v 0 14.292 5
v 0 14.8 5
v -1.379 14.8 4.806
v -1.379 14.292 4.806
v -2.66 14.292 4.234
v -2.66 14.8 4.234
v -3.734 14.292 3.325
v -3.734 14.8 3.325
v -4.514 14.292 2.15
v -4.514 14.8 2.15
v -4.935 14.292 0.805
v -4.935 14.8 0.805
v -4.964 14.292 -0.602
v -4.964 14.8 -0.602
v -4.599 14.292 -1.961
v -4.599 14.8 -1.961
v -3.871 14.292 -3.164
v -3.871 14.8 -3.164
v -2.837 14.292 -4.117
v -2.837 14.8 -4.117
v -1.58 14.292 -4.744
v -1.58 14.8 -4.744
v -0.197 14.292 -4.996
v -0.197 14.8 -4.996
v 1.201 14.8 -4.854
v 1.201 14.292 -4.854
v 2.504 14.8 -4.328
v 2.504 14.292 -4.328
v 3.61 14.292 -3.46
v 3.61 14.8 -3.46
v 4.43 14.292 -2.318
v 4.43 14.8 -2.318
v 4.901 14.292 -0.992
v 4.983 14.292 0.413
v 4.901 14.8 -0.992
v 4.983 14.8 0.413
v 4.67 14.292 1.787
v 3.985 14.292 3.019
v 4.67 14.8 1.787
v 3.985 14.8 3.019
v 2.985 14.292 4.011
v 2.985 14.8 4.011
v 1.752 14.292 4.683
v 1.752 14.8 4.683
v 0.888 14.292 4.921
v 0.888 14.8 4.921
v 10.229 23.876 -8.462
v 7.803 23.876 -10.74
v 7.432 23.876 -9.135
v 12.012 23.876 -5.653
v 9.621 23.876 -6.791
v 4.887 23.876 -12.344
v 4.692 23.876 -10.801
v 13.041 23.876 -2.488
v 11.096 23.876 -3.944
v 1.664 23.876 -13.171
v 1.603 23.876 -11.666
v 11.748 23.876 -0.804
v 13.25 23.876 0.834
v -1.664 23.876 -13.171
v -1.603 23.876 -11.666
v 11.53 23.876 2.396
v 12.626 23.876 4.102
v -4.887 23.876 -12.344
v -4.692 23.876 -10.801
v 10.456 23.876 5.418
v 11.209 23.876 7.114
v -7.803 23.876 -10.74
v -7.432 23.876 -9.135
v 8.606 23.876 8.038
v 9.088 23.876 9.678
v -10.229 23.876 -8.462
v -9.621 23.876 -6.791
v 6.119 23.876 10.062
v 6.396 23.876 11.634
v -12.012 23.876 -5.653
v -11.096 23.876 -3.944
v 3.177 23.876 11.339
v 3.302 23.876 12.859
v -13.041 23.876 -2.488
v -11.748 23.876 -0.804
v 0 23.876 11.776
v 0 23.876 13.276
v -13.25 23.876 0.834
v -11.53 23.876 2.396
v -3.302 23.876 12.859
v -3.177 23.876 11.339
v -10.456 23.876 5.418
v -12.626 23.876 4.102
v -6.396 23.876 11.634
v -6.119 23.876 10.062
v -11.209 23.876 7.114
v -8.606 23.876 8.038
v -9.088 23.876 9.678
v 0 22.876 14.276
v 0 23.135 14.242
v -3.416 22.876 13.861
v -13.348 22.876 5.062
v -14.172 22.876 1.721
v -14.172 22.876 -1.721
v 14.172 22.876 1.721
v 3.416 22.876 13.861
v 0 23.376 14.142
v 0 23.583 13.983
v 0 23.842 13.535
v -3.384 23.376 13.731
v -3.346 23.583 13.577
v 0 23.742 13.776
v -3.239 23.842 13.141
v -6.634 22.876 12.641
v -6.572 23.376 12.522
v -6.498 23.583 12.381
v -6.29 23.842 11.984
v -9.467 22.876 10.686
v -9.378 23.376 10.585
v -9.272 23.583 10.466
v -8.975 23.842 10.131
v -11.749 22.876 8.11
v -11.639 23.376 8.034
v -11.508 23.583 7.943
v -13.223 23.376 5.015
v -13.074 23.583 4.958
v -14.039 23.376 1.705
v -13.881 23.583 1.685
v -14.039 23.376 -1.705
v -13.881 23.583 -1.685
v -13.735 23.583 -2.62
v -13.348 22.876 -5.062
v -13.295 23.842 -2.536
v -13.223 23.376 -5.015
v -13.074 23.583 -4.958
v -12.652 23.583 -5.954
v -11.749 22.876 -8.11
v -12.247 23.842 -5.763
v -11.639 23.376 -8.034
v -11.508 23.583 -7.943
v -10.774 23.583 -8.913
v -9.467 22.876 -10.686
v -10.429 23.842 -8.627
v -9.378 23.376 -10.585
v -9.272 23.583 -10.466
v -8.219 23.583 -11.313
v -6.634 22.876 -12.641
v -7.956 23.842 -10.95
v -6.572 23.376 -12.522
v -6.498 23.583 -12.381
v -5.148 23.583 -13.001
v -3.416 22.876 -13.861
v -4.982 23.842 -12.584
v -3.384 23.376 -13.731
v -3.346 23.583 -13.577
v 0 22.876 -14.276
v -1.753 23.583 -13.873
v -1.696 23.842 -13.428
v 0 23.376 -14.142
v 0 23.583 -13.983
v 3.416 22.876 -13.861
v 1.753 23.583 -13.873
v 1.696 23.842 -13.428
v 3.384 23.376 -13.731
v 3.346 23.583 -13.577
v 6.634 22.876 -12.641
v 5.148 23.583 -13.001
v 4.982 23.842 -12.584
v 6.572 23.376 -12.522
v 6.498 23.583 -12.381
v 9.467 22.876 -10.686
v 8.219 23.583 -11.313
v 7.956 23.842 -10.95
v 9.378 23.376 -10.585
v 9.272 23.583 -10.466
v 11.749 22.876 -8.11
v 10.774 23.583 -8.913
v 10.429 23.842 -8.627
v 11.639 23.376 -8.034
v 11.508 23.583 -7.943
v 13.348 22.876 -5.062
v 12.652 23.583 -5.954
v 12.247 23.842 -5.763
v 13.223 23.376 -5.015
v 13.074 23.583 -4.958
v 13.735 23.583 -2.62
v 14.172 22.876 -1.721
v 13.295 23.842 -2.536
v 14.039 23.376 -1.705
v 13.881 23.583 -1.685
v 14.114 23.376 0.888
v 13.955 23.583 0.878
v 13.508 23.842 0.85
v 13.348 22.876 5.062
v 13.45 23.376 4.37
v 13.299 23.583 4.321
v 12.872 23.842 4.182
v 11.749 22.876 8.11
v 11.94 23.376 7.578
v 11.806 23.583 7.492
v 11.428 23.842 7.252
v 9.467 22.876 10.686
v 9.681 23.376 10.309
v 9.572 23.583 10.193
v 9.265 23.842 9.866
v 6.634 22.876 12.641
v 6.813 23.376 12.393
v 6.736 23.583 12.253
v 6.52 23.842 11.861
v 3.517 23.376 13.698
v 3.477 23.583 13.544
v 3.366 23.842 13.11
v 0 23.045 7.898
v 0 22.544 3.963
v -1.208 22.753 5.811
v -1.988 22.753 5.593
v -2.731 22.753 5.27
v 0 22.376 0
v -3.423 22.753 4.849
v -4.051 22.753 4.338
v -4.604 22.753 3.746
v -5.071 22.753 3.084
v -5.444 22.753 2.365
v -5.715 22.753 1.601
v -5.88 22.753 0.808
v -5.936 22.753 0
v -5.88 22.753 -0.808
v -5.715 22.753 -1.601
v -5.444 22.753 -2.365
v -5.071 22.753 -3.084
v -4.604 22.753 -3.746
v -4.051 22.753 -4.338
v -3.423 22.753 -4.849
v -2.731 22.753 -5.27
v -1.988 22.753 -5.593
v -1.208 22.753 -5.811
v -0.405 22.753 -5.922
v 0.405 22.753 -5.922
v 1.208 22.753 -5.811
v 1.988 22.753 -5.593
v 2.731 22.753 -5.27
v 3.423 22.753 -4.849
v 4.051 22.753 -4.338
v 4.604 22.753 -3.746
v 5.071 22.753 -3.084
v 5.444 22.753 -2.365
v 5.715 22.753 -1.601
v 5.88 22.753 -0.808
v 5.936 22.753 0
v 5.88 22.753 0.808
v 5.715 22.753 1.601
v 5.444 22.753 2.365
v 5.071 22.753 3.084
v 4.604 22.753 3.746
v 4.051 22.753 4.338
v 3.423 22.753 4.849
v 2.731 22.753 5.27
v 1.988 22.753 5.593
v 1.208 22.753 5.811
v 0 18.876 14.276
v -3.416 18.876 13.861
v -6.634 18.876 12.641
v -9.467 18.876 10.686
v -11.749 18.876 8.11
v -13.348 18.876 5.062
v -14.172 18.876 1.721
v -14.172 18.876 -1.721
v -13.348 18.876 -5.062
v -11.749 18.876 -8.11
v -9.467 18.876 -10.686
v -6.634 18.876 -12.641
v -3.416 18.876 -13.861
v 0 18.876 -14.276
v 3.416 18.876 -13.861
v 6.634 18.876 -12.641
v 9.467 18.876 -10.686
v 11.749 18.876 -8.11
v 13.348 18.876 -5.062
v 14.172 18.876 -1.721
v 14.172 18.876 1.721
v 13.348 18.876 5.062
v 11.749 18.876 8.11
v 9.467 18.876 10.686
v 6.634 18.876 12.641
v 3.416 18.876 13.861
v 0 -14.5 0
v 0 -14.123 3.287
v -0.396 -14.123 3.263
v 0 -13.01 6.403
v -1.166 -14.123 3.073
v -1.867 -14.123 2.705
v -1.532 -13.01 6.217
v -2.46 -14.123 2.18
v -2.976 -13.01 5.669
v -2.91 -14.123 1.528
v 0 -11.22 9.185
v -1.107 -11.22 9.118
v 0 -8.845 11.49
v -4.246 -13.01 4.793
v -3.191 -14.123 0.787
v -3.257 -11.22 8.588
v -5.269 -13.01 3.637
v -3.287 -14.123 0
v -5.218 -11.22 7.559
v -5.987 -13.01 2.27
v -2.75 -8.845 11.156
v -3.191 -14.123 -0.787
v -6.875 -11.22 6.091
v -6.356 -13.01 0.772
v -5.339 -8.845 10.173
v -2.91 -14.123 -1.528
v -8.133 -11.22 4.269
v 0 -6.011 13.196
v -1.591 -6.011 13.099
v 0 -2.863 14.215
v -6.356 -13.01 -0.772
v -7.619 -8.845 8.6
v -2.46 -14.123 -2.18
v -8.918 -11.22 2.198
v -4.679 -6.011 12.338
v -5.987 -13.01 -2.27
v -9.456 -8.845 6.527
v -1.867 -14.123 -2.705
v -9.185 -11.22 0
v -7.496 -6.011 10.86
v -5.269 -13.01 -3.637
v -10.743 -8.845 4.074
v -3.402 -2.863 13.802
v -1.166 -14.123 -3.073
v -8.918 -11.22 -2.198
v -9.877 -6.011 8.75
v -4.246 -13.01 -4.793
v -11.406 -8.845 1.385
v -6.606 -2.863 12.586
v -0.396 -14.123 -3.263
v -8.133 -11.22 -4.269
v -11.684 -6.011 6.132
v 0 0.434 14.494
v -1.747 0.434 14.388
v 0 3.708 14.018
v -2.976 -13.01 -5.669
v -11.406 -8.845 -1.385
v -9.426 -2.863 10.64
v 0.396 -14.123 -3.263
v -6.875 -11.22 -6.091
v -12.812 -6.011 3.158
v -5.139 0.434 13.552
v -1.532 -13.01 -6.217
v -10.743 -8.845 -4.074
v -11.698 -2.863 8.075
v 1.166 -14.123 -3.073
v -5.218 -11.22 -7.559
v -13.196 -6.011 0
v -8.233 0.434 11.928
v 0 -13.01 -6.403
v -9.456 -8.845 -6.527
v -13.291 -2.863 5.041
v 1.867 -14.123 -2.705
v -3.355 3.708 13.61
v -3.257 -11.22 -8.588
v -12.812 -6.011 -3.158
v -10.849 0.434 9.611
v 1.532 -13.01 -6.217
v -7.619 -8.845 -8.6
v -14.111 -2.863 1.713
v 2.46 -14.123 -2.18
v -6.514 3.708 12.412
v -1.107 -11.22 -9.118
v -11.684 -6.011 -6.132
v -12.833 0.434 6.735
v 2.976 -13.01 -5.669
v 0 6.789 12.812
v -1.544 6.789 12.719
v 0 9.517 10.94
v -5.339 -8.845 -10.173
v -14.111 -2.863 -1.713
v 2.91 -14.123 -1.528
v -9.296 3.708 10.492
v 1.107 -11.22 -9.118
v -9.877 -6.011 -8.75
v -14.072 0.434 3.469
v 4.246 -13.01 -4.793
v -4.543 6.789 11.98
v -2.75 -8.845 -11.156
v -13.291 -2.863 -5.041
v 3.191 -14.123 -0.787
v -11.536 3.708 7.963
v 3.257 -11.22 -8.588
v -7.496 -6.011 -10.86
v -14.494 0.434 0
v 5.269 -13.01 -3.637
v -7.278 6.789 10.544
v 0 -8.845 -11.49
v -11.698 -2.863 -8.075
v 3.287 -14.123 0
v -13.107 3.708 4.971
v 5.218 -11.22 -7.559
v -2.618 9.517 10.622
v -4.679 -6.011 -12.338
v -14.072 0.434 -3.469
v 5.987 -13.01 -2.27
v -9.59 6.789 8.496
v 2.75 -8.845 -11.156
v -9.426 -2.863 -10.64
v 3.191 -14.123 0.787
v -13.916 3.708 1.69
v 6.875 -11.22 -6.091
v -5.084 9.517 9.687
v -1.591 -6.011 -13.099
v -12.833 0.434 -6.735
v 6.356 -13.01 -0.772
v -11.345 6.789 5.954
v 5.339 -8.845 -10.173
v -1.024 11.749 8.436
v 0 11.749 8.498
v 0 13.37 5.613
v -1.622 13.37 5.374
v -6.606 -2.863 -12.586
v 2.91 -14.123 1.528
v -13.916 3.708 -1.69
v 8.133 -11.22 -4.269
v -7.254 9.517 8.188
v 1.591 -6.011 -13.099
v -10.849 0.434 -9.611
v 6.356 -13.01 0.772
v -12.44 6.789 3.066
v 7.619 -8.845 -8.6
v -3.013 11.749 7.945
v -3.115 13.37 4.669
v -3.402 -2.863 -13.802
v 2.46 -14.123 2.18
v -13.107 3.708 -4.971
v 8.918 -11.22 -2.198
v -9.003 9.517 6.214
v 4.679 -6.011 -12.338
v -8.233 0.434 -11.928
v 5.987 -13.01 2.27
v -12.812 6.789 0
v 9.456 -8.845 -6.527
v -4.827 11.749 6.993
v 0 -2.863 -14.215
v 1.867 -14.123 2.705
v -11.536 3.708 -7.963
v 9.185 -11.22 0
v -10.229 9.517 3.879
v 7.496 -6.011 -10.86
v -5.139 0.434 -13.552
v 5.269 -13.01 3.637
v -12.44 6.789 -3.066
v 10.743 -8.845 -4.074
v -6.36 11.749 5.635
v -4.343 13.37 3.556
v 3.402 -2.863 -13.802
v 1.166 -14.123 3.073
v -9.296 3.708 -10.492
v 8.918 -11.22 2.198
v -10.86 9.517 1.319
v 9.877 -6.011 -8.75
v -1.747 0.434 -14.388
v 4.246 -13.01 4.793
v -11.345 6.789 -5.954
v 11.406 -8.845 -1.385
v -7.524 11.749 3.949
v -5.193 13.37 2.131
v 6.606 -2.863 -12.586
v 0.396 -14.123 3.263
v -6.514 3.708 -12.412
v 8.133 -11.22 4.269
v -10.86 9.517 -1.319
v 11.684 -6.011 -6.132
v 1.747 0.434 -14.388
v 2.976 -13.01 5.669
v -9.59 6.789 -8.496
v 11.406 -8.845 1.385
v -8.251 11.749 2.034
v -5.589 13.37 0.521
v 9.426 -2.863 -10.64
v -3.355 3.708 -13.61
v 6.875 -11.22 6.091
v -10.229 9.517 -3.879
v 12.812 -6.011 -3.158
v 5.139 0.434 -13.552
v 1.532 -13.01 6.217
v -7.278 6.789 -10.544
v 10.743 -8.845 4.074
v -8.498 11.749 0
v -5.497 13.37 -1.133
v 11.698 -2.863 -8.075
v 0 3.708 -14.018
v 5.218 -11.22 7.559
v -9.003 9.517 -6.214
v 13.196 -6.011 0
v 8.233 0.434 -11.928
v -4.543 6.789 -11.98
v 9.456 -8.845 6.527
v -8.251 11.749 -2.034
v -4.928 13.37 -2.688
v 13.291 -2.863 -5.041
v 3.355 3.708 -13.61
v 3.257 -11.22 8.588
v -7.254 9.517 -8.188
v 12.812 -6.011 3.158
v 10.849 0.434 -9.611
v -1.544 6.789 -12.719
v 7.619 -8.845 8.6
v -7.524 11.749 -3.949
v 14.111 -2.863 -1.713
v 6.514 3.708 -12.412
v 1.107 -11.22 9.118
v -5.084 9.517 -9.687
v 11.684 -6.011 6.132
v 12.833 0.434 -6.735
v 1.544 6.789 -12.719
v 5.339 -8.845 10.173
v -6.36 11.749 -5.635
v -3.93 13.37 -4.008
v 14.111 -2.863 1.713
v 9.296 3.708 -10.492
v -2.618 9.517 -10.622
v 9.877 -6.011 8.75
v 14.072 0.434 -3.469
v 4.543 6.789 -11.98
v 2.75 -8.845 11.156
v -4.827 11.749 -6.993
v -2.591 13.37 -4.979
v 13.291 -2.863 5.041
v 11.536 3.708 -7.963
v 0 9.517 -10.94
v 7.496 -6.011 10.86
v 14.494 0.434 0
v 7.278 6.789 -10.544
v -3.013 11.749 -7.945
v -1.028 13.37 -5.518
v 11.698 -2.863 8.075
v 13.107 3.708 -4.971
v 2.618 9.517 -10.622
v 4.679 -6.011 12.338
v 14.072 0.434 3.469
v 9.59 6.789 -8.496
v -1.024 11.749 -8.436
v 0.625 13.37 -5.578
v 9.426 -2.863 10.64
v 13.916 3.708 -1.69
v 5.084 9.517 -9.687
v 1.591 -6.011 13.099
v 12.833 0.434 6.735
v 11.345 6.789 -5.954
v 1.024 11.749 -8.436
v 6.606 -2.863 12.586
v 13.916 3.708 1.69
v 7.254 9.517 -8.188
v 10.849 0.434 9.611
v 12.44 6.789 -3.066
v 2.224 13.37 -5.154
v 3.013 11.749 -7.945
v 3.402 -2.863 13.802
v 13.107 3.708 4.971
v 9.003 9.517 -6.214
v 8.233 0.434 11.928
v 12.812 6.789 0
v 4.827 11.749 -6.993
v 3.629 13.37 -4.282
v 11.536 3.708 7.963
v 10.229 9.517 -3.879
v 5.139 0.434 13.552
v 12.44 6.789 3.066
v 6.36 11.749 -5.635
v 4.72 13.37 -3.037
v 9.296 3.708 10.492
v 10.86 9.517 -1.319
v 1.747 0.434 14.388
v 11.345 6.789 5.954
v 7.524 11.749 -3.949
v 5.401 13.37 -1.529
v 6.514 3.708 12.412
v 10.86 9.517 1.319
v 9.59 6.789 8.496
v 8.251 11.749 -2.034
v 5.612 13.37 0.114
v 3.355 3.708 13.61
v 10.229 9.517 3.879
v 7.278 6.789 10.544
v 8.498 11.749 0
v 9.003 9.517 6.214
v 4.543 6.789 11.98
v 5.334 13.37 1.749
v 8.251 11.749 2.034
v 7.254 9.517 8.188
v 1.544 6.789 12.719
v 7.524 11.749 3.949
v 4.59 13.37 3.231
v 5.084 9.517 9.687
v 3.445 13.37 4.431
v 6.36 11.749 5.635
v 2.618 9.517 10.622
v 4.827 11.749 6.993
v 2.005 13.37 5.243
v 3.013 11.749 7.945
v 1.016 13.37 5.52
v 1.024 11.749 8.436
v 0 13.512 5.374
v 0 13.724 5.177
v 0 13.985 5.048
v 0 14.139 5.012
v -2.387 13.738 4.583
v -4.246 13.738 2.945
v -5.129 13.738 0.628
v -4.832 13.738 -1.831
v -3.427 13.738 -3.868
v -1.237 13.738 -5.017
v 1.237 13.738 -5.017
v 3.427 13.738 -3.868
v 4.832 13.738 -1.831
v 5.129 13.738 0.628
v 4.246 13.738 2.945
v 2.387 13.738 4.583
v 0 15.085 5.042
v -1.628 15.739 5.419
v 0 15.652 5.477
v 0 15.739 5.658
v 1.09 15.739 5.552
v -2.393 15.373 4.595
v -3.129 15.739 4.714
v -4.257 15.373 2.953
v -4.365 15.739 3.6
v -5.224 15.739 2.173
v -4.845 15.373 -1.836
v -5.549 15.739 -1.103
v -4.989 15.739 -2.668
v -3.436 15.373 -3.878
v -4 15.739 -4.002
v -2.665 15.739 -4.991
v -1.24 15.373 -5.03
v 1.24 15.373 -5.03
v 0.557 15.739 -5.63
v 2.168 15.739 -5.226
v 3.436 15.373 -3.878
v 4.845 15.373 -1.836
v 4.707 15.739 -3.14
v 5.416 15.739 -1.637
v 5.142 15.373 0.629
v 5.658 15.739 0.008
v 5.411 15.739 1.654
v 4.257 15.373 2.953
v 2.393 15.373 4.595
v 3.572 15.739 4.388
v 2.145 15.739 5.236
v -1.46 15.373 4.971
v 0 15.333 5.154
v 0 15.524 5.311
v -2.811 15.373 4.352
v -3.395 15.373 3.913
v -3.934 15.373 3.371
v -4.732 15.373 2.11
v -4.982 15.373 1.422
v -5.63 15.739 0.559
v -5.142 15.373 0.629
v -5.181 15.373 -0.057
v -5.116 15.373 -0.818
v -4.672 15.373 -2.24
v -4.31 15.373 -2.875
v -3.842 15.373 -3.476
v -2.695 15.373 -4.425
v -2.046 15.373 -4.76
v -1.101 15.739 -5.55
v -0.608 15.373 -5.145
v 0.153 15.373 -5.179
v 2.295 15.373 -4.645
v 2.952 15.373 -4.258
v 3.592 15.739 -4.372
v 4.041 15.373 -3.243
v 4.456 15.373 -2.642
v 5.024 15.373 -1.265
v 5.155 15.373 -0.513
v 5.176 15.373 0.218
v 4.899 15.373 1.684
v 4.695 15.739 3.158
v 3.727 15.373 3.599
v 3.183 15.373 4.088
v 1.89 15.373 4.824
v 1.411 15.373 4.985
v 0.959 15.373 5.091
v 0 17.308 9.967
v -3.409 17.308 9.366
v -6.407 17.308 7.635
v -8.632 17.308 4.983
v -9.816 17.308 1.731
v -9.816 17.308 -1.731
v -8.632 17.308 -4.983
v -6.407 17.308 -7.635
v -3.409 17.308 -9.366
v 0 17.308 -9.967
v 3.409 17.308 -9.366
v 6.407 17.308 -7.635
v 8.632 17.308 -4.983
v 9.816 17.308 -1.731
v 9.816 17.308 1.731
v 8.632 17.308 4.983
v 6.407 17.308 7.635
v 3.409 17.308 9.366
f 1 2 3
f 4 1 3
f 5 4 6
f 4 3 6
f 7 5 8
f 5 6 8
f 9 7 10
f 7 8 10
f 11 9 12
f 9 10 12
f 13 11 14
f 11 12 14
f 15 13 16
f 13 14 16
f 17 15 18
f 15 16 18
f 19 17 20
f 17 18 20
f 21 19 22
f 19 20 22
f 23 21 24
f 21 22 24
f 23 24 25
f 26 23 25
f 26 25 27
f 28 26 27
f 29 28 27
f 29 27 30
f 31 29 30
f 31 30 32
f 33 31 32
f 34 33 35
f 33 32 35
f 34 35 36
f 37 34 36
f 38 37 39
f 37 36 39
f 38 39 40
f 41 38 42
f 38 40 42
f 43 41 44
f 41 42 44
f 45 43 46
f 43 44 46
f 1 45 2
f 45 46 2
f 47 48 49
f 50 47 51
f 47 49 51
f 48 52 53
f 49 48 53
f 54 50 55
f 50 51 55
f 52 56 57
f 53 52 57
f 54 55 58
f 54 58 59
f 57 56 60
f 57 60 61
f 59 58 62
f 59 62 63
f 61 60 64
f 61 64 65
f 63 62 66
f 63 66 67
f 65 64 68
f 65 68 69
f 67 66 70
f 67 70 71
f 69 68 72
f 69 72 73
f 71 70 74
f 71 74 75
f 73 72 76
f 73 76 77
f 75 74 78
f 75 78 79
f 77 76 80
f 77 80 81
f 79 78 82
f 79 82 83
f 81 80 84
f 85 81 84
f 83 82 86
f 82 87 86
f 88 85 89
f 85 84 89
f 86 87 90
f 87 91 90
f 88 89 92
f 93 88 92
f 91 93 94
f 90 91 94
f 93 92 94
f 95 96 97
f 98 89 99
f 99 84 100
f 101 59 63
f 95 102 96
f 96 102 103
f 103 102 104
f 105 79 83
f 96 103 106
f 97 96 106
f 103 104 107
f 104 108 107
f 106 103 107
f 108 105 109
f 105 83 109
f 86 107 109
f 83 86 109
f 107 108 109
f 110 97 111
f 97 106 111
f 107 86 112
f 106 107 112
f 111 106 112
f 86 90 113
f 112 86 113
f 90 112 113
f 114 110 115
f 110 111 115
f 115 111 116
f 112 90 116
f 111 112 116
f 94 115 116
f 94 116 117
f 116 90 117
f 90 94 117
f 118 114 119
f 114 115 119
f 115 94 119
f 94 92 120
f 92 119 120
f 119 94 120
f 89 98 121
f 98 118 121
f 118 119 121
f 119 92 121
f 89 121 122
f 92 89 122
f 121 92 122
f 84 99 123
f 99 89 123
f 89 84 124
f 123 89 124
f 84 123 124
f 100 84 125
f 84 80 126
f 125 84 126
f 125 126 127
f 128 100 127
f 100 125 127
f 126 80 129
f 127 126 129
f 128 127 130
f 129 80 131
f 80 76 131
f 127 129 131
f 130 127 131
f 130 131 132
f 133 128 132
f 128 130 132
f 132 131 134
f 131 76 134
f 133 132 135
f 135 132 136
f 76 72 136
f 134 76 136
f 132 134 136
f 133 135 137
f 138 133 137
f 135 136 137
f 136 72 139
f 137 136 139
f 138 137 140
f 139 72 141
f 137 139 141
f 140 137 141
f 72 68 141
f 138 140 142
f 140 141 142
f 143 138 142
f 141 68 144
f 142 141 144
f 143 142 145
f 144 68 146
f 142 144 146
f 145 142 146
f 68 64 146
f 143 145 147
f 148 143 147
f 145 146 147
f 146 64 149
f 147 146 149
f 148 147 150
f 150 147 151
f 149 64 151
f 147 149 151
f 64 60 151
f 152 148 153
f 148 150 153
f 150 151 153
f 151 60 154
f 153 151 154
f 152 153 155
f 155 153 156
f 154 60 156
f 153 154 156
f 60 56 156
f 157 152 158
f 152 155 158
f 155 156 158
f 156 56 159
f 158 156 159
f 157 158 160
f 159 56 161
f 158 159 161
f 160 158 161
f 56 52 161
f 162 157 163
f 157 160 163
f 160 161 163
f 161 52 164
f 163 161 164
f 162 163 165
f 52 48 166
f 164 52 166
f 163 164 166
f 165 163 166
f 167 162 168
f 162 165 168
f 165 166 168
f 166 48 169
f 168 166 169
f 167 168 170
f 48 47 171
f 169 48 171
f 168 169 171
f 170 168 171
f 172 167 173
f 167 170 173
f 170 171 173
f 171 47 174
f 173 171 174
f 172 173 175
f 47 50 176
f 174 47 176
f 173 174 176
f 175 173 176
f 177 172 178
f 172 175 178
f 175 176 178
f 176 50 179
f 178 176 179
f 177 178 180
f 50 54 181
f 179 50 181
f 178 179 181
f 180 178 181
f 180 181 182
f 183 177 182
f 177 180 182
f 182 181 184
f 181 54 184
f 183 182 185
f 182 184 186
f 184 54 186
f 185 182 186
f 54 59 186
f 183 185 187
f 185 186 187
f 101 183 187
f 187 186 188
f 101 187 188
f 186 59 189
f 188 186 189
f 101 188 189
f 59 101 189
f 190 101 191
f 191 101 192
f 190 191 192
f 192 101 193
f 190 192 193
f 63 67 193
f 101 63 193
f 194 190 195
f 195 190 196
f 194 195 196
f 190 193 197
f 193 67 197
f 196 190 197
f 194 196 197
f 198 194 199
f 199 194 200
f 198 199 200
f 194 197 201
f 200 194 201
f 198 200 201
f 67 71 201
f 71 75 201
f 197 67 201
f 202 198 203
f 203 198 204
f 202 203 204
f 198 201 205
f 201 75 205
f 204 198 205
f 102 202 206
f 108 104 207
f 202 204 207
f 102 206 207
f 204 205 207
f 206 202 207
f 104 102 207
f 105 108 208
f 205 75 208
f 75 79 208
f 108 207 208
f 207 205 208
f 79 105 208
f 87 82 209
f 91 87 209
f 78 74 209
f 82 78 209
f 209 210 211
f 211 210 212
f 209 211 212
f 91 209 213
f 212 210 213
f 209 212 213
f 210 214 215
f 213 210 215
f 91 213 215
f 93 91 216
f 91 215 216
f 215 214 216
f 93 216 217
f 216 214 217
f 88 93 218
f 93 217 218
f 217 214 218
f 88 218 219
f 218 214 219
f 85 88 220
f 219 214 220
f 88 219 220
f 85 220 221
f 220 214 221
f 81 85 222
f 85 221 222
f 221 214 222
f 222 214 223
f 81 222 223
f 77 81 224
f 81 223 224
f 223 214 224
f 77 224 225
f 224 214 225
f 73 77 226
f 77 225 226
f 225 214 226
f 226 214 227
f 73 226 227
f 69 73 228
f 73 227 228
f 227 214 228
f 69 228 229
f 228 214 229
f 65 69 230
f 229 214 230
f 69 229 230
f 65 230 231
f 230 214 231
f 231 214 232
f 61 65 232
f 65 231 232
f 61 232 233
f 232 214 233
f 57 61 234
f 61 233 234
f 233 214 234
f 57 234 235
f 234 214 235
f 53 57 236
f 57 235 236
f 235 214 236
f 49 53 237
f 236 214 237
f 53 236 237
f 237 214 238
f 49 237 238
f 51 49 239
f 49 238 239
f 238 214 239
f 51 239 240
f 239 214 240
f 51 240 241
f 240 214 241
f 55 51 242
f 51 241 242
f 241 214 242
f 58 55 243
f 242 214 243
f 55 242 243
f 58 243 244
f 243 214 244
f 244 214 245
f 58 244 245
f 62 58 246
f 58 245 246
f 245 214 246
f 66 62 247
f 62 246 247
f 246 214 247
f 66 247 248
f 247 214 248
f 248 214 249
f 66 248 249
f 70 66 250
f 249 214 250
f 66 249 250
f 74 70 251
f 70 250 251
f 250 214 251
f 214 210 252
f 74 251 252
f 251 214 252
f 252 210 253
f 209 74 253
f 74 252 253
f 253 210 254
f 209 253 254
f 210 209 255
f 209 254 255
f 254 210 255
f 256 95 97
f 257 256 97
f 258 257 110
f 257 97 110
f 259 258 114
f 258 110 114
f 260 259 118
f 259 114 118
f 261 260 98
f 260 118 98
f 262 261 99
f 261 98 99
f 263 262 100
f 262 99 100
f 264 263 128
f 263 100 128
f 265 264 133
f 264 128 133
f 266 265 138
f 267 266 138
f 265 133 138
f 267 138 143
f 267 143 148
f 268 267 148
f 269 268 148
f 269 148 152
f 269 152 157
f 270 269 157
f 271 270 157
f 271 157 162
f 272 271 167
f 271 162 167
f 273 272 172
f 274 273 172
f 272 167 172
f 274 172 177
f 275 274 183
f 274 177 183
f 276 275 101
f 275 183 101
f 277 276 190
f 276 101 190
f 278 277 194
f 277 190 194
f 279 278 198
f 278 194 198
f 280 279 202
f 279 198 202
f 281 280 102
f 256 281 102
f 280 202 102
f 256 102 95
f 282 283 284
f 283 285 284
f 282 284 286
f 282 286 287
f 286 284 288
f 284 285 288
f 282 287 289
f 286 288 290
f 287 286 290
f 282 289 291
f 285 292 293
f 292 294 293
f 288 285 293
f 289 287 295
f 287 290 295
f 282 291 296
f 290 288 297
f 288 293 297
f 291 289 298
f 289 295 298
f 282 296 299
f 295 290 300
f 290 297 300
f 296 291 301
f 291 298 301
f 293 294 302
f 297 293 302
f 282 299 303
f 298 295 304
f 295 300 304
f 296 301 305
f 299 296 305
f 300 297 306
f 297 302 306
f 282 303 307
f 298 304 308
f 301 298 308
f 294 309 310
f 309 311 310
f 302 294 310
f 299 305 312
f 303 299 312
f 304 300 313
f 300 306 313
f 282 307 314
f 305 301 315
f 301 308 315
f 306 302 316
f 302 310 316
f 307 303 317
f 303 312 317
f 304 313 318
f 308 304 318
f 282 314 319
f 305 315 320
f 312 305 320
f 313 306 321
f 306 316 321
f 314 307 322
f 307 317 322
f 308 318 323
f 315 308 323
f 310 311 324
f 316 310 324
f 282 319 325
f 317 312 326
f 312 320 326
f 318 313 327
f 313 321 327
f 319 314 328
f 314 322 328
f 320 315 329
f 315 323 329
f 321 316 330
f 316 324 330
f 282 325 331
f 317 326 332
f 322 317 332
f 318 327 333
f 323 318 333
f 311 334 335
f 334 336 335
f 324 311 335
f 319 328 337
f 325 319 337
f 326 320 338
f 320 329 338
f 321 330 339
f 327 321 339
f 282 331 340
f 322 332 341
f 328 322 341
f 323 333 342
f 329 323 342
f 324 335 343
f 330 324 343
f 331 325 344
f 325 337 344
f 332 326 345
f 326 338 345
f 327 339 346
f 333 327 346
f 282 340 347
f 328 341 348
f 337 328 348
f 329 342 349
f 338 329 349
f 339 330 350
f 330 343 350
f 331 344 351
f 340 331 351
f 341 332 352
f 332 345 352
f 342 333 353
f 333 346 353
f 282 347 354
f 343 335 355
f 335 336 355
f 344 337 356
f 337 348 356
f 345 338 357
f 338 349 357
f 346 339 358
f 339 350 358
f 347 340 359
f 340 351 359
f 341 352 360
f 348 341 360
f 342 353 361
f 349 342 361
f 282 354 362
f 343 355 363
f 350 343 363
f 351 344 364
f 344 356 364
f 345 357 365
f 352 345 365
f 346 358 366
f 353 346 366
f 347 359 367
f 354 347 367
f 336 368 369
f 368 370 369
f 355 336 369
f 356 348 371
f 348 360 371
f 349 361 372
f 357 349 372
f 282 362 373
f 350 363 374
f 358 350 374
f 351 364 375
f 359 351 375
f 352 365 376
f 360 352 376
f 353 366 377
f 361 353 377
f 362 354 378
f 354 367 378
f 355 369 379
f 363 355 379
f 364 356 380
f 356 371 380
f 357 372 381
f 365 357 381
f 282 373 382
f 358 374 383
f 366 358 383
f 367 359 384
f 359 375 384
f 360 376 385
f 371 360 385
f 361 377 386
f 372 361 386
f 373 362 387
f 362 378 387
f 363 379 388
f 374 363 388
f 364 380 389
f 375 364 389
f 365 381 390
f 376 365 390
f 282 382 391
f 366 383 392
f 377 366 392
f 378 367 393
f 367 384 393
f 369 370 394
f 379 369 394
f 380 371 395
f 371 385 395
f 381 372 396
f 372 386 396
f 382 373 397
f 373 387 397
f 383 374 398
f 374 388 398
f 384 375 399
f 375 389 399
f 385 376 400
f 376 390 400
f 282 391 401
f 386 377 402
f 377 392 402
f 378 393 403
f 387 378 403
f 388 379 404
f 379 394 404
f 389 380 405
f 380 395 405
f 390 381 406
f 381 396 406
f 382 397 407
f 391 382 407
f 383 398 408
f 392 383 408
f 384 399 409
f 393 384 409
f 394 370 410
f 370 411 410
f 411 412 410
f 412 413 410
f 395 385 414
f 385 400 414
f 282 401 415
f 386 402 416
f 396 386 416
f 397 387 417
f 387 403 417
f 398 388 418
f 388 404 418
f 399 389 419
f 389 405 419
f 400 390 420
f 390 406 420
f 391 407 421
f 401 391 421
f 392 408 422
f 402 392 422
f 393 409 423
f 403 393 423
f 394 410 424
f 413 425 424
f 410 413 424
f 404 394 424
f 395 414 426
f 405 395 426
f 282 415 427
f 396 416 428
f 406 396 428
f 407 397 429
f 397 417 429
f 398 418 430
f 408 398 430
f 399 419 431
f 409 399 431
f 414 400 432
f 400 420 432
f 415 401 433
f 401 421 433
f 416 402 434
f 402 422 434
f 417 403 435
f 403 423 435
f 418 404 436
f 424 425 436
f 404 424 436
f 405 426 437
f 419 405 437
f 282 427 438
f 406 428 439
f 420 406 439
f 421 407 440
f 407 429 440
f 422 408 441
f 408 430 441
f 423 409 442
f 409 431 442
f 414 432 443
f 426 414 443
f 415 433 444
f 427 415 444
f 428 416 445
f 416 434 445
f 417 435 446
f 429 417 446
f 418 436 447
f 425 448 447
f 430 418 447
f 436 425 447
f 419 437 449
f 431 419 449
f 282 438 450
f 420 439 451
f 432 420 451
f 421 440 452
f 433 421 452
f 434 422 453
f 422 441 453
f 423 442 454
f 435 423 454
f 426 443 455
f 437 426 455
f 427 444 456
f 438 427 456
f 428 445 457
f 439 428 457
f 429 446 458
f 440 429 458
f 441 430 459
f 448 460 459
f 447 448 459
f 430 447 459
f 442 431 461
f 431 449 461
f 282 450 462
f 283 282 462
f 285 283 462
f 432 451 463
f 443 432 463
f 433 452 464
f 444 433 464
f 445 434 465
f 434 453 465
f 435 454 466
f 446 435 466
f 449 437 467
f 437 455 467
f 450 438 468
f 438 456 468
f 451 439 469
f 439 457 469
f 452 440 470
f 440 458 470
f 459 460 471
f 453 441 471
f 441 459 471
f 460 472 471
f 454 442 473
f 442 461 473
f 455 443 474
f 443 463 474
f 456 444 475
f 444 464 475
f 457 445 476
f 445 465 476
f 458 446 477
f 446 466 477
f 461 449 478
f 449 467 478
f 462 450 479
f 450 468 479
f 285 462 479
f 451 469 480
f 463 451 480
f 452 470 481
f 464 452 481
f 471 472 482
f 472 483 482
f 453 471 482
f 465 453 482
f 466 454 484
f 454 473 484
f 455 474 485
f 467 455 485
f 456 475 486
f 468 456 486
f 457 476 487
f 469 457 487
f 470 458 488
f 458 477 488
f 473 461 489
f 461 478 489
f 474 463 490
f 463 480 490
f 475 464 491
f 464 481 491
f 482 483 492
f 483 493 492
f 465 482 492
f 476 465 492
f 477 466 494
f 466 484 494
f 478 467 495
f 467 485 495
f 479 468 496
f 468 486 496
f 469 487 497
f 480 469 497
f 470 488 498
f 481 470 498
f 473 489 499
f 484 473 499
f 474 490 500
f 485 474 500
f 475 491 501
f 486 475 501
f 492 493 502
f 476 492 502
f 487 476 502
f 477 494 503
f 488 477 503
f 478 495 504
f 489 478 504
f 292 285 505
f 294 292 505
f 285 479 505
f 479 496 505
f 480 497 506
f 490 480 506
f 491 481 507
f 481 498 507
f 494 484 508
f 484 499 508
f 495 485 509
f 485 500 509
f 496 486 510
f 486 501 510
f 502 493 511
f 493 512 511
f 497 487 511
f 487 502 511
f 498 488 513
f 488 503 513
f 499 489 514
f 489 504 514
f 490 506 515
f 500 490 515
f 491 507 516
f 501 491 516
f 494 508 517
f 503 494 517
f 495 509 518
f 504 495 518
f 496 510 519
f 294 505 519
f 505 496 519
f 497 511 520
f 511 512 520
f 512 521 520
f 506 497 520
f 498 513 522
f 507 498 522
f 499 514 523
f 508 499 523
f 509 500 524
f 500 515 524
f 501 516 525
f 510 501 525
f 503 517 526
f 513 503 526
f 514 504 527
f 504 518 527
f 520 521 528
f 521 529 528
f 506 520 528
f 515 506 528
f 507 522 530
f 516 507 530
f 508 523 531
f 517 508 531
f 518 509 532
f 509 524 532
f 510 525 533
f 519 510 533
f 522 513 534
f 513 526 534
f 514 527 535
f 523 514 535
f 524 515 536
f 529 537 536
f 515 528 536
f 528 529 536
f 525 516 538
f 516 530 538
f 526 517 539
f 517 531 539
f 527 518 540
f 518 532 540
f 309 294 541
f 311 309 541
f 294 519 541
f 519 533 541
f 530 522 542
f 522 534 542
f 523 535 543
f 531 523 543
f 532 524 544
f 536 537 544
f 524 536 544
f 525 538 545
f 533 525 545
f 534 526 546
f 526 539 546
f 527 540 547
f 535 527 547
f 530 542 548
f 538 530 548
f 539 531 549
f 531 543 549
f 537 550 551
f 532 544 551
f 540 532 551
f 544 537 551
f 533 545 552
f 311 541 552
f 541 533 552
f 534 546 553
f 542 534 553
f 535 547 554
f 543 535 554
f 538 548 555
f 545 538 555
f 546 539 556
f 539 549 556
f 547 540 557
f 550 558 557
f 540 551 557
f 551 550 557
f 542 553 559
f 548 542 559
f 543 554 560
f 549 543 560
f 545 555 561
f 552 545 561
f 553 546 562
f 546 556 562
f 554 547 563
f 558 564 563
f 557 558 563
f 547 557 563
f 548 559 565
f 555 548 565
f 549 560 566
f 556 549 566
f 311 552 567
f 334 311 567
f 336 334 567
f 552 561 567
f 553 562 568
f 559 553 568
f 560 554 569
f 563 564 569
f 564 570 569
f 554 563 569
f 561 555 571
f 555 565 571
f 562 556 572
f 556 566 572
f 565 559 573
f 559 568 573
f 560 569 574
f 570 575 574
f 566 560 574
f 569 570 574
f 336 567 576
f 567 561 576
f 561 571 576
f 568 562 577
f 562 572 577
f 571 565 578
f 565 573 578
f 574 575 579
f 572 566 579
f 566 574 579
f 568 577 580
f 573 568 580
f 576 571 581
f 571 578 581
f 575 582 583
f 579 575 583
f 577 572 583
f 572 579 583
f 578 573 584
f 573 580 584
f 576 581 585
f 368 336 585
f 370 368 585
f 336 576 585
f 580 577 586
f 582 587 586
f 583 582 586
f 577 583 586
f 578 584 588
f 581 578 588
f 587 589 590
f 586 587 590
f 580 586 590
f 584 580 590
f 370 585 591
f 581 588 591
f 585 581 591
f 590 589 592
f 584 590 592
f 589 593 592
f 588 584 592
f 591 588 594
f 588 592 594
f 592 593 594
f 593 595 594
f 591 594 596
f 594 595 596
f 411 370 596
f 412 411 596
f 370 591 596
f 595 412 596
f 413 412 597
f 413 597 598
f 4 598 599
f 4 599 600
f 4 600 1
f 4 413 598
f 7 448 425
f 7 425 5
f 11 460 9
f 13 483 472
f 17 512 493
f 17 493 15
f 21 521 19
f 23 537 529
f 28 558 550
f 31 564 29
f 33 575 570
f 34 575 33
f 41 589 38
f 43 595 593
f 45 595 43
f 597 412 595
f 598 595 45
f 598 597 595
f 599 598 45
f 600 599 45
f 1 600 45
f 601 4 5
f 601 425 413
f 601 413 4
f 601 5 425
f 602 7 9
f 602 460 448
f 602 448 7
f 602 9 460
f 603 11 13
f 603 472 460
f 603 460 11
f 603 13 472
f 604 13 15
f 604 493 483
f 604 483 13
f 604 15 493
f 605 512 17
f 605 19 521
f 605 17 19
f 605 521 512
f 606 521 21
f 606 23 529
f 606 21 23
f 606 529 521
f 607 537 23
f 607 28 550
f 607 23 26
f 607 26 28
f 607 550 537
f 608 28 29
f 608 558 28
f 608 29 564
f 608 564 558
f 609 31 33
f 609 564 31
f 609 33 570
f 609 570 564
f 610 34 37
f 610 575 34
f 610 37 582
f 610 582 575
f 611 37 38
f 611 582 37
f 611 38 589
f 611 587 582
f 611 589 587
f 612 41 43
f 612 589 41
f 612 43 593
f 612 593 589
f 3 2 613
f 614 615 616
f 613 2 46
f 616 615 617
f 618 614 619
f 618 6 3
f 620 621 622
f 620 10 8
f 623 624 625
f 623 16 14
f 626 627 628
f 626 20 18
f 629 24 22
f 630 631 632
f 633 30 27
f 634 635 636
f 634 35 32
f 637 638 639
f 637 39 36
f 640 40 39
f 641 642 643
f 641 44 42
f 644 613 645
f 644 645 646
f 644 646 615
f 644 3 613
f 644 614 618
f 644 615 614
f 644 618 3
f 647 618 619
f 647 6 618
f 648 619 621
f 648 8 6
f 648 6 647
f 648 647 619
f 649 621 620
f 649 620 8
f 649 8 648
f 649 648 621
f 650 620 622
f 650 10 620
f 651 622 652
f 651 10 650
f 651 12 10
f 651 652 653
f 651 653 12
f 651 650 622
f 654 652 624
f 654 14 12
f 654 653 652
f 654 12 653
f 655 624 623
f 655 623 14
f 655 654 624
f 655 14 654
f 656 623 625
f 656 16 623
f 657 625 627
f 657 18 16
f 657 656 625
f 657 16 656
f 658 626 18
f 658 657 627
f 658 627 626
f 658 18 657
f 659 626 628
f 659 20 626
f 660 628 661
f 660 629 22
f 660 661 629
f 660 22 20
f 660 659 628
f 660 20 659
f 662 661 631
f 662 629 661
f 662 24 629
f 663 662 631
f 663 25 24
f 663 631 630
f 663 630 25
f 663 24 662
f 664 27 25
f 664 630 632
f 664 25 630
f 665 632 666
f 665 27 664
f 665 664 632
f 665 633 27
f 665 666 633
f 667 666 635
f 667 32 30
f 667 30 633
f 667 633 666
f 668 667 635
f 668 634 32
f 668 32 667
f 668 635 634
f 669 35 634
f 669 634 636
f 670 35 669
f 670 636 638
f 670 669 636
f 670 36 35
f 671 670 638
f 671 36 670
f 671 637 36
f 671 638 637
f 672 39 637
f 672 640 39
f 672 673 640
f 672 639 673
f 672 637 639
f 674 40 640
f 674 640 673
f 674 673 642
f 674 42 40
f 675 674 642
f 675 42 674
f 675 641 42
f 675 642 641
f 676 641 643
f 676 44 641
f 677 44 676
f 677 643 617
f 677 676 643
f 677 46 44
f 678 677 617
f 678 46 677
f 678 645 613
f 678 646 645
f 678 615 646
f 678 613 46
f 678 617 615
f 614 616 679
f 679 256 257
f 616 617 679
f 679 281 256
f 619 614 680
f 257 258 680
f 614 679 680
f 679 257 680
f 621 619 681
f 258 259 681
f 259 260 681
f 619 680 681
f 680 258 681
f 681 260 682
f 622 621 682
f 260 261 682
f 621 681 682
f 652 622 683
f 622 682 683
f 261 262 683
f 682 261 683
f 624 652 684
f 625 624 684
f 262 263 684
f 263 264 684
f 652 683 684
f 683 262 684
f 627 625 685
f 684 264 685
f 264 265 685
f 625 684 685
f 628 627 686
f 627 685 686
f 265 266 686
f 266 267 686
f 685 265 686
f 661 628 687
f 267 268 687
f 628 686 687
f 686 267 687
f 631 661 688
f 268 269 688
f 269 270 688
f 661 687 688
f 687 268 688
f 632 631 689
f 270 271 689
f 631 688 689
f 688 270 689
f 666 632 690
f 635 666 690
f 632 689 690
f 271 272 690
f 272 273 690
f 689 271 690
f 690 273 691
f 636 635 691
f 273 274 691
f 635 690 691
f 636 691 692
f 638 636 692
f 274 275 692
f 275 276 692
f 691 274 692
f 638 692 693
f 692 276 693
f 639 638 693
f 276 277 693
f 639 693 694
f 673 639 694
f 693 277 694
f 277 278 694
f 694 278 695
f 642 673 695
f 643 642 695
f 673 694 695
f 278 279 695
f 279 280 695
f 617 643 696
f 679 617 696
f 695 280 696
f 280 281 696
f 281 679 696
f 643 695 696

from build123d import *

# Parameters (mm, degrees)
FILLET1_R = 1


with BuildPart() as part:
    # Sketch1 → Revolve1 (revolve)
    with BuildSketch(Plane.XY, mode=Mode.PRIVATE) as revolve1_sk:
        with BuildLine():
            Line((0, 13.938923092), (0, -14.5))
            ThreePointArc((0, -14.5), (14.275933158, -2.539238563), (5, 13.610657589))
            Line((5, 13.610657589), (5, 15.5))
            Line((5, 15.5), (14.275933158, 18.876163564))
            Line((14.275933158, 18.876163564), (14.275933158, 23.876163564))
            Line((14.275933158, 23.876163564), (11.775933158, 23.876163564))
            ThreePointArc((11.775933158, 23.876163564), (5.935541292, 22.752672467), (0, 22.376163564))
            Line((0, 22.376163564), (0, 13.938923092))
        make_face()
    revolve(revolve1_sk.sketch.rotate(Axis((0, 13.938923092, 0), (0, -1, 0)), 90), axis=Axis((0, 13.938923092, 0), (0, -1, 0)))

    # Fillet1
    fillet1_edges = [part.edges().sort_by_distance(p)[0] for p in [
        (0, 13.610657589, -5),
        (0, 23.876163564, -14.275933158),
        (0, 15.5, -5),
    ]]
    fillet(fillet1_edges, radius=FILLET1_R)


solid = part.part
